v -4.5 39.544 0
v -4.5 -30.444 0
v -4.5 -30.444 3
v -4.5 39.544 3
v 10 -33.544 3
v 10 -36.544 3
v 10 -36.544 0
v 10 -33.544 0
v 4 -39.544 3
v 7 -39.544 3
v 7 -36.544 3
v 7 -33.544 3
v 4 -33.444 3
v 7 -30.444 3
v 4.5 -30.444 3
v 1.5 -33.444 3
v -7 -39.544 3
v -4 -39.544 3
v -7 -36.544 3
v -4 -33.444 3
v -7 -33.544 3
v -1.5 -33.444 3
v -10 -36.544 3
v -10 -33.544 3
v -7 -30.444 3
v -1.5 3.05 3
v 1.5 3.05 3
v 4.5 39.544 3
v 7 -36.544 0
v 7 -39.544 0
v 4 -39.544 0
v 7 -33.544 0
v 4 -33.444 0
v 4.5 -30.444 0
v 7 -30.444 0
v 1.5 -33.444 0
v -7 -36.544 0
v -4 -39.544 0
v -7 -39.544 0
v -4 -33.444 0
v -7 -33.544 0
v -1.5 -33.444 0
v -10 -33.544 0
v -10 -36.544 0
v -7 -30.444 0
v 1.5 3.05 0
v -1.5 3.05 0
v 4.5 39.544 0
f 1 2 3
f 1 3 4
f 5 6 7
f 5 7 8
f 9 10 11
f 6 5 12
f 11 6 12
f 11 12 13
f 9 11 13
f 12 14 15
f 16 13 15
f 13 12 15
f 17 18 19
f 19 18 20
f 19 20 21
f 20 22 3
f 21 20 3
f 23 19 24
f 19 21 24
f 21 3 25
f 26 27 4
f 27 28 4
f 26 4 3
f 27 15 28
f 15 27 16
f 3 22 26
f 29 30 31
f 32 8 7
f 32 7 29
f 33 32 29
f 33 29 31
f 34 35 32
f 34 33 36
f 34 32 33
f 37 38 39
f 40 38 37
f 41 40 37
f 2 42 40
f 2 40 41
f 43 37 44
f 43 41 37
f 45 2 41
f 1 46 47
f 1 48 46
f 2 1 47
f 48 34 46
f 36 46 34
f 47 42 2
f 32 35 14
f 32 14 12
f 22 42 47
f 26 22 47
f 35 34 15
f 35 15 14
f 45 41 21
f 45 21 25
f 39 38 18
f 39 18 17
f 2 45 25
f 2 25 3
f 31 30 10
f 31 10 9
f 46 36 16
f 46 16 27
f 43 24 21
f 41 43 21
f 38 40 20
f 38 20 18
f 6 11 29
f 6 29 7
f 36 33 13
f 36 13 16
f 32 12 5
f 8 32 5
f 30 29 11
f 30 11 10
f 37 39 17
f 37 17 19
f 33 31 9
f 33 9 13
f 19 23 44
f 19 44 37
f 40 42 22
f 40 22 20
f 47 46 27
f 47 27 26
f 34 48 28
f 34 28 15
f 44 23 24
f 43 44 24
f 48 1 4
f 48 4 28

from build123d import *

# Parameters (mm, degrees)
EXTRUDE_1_DEPTH     = 3
SKETCH_2_W          = 3
SKETCH_2_H          = 36.493999941
CUT_EXTRUDE_1_DEPTH = 3
SKETCH_3_W          = 3
SKETCH_3_H          = 3
EXTRUDE_2_DEPTH     = 3


with BuildPart() as part:
    # 스케치1 → 보스-돌출1 (new body)
    with BuildSketch(Plane.XY):
        Polygon((-4.5, 39.543999941), (4.5, 39.543999941), (4.5, -30.443999941), (7, -30.443999941), (7, -39.543999941), (4, -39.543999941), (4, -33.443999941), (-4, -33.443999941), (-4, -39.543999941), (-7, -39.543999941), (-7, -30.443999941), (-4.5, -30.443999941), align=None)
    extrude(amount=EXTRUDE_1_DEPTH)

    # 스케치2 → 컷-돌출1 (cut)
    with BuildSketch(Plane(origin=(0, 0, 0), x_dir=(-1, 0, 0), z_dir=(0, 0, -1))):
        with Locations((0, -15.196999971)):
            Rectangle(SKETCH_2_W, SKETCH_2_H)
    extrude(amount=-CUT_EXTRUDE_1_DEPTH, mode=Mode.SUBTRACT)

    # 스케치3 → 보스-돌출2 (add)
    with BuildSketch(Plane.XY.offset(3)):
        with Locations((-8.5, -35.043999941)):
            Rectangle(SKETCH_3_W, SKETCH_3_H)
        with Locations((8.5, -35.043999941)):
            Rectangle(SKETCH_3_W, SKETCH_3_H)
    extrude(amount=-EXTRUDE_2_DEPTH)


solid = part.part
